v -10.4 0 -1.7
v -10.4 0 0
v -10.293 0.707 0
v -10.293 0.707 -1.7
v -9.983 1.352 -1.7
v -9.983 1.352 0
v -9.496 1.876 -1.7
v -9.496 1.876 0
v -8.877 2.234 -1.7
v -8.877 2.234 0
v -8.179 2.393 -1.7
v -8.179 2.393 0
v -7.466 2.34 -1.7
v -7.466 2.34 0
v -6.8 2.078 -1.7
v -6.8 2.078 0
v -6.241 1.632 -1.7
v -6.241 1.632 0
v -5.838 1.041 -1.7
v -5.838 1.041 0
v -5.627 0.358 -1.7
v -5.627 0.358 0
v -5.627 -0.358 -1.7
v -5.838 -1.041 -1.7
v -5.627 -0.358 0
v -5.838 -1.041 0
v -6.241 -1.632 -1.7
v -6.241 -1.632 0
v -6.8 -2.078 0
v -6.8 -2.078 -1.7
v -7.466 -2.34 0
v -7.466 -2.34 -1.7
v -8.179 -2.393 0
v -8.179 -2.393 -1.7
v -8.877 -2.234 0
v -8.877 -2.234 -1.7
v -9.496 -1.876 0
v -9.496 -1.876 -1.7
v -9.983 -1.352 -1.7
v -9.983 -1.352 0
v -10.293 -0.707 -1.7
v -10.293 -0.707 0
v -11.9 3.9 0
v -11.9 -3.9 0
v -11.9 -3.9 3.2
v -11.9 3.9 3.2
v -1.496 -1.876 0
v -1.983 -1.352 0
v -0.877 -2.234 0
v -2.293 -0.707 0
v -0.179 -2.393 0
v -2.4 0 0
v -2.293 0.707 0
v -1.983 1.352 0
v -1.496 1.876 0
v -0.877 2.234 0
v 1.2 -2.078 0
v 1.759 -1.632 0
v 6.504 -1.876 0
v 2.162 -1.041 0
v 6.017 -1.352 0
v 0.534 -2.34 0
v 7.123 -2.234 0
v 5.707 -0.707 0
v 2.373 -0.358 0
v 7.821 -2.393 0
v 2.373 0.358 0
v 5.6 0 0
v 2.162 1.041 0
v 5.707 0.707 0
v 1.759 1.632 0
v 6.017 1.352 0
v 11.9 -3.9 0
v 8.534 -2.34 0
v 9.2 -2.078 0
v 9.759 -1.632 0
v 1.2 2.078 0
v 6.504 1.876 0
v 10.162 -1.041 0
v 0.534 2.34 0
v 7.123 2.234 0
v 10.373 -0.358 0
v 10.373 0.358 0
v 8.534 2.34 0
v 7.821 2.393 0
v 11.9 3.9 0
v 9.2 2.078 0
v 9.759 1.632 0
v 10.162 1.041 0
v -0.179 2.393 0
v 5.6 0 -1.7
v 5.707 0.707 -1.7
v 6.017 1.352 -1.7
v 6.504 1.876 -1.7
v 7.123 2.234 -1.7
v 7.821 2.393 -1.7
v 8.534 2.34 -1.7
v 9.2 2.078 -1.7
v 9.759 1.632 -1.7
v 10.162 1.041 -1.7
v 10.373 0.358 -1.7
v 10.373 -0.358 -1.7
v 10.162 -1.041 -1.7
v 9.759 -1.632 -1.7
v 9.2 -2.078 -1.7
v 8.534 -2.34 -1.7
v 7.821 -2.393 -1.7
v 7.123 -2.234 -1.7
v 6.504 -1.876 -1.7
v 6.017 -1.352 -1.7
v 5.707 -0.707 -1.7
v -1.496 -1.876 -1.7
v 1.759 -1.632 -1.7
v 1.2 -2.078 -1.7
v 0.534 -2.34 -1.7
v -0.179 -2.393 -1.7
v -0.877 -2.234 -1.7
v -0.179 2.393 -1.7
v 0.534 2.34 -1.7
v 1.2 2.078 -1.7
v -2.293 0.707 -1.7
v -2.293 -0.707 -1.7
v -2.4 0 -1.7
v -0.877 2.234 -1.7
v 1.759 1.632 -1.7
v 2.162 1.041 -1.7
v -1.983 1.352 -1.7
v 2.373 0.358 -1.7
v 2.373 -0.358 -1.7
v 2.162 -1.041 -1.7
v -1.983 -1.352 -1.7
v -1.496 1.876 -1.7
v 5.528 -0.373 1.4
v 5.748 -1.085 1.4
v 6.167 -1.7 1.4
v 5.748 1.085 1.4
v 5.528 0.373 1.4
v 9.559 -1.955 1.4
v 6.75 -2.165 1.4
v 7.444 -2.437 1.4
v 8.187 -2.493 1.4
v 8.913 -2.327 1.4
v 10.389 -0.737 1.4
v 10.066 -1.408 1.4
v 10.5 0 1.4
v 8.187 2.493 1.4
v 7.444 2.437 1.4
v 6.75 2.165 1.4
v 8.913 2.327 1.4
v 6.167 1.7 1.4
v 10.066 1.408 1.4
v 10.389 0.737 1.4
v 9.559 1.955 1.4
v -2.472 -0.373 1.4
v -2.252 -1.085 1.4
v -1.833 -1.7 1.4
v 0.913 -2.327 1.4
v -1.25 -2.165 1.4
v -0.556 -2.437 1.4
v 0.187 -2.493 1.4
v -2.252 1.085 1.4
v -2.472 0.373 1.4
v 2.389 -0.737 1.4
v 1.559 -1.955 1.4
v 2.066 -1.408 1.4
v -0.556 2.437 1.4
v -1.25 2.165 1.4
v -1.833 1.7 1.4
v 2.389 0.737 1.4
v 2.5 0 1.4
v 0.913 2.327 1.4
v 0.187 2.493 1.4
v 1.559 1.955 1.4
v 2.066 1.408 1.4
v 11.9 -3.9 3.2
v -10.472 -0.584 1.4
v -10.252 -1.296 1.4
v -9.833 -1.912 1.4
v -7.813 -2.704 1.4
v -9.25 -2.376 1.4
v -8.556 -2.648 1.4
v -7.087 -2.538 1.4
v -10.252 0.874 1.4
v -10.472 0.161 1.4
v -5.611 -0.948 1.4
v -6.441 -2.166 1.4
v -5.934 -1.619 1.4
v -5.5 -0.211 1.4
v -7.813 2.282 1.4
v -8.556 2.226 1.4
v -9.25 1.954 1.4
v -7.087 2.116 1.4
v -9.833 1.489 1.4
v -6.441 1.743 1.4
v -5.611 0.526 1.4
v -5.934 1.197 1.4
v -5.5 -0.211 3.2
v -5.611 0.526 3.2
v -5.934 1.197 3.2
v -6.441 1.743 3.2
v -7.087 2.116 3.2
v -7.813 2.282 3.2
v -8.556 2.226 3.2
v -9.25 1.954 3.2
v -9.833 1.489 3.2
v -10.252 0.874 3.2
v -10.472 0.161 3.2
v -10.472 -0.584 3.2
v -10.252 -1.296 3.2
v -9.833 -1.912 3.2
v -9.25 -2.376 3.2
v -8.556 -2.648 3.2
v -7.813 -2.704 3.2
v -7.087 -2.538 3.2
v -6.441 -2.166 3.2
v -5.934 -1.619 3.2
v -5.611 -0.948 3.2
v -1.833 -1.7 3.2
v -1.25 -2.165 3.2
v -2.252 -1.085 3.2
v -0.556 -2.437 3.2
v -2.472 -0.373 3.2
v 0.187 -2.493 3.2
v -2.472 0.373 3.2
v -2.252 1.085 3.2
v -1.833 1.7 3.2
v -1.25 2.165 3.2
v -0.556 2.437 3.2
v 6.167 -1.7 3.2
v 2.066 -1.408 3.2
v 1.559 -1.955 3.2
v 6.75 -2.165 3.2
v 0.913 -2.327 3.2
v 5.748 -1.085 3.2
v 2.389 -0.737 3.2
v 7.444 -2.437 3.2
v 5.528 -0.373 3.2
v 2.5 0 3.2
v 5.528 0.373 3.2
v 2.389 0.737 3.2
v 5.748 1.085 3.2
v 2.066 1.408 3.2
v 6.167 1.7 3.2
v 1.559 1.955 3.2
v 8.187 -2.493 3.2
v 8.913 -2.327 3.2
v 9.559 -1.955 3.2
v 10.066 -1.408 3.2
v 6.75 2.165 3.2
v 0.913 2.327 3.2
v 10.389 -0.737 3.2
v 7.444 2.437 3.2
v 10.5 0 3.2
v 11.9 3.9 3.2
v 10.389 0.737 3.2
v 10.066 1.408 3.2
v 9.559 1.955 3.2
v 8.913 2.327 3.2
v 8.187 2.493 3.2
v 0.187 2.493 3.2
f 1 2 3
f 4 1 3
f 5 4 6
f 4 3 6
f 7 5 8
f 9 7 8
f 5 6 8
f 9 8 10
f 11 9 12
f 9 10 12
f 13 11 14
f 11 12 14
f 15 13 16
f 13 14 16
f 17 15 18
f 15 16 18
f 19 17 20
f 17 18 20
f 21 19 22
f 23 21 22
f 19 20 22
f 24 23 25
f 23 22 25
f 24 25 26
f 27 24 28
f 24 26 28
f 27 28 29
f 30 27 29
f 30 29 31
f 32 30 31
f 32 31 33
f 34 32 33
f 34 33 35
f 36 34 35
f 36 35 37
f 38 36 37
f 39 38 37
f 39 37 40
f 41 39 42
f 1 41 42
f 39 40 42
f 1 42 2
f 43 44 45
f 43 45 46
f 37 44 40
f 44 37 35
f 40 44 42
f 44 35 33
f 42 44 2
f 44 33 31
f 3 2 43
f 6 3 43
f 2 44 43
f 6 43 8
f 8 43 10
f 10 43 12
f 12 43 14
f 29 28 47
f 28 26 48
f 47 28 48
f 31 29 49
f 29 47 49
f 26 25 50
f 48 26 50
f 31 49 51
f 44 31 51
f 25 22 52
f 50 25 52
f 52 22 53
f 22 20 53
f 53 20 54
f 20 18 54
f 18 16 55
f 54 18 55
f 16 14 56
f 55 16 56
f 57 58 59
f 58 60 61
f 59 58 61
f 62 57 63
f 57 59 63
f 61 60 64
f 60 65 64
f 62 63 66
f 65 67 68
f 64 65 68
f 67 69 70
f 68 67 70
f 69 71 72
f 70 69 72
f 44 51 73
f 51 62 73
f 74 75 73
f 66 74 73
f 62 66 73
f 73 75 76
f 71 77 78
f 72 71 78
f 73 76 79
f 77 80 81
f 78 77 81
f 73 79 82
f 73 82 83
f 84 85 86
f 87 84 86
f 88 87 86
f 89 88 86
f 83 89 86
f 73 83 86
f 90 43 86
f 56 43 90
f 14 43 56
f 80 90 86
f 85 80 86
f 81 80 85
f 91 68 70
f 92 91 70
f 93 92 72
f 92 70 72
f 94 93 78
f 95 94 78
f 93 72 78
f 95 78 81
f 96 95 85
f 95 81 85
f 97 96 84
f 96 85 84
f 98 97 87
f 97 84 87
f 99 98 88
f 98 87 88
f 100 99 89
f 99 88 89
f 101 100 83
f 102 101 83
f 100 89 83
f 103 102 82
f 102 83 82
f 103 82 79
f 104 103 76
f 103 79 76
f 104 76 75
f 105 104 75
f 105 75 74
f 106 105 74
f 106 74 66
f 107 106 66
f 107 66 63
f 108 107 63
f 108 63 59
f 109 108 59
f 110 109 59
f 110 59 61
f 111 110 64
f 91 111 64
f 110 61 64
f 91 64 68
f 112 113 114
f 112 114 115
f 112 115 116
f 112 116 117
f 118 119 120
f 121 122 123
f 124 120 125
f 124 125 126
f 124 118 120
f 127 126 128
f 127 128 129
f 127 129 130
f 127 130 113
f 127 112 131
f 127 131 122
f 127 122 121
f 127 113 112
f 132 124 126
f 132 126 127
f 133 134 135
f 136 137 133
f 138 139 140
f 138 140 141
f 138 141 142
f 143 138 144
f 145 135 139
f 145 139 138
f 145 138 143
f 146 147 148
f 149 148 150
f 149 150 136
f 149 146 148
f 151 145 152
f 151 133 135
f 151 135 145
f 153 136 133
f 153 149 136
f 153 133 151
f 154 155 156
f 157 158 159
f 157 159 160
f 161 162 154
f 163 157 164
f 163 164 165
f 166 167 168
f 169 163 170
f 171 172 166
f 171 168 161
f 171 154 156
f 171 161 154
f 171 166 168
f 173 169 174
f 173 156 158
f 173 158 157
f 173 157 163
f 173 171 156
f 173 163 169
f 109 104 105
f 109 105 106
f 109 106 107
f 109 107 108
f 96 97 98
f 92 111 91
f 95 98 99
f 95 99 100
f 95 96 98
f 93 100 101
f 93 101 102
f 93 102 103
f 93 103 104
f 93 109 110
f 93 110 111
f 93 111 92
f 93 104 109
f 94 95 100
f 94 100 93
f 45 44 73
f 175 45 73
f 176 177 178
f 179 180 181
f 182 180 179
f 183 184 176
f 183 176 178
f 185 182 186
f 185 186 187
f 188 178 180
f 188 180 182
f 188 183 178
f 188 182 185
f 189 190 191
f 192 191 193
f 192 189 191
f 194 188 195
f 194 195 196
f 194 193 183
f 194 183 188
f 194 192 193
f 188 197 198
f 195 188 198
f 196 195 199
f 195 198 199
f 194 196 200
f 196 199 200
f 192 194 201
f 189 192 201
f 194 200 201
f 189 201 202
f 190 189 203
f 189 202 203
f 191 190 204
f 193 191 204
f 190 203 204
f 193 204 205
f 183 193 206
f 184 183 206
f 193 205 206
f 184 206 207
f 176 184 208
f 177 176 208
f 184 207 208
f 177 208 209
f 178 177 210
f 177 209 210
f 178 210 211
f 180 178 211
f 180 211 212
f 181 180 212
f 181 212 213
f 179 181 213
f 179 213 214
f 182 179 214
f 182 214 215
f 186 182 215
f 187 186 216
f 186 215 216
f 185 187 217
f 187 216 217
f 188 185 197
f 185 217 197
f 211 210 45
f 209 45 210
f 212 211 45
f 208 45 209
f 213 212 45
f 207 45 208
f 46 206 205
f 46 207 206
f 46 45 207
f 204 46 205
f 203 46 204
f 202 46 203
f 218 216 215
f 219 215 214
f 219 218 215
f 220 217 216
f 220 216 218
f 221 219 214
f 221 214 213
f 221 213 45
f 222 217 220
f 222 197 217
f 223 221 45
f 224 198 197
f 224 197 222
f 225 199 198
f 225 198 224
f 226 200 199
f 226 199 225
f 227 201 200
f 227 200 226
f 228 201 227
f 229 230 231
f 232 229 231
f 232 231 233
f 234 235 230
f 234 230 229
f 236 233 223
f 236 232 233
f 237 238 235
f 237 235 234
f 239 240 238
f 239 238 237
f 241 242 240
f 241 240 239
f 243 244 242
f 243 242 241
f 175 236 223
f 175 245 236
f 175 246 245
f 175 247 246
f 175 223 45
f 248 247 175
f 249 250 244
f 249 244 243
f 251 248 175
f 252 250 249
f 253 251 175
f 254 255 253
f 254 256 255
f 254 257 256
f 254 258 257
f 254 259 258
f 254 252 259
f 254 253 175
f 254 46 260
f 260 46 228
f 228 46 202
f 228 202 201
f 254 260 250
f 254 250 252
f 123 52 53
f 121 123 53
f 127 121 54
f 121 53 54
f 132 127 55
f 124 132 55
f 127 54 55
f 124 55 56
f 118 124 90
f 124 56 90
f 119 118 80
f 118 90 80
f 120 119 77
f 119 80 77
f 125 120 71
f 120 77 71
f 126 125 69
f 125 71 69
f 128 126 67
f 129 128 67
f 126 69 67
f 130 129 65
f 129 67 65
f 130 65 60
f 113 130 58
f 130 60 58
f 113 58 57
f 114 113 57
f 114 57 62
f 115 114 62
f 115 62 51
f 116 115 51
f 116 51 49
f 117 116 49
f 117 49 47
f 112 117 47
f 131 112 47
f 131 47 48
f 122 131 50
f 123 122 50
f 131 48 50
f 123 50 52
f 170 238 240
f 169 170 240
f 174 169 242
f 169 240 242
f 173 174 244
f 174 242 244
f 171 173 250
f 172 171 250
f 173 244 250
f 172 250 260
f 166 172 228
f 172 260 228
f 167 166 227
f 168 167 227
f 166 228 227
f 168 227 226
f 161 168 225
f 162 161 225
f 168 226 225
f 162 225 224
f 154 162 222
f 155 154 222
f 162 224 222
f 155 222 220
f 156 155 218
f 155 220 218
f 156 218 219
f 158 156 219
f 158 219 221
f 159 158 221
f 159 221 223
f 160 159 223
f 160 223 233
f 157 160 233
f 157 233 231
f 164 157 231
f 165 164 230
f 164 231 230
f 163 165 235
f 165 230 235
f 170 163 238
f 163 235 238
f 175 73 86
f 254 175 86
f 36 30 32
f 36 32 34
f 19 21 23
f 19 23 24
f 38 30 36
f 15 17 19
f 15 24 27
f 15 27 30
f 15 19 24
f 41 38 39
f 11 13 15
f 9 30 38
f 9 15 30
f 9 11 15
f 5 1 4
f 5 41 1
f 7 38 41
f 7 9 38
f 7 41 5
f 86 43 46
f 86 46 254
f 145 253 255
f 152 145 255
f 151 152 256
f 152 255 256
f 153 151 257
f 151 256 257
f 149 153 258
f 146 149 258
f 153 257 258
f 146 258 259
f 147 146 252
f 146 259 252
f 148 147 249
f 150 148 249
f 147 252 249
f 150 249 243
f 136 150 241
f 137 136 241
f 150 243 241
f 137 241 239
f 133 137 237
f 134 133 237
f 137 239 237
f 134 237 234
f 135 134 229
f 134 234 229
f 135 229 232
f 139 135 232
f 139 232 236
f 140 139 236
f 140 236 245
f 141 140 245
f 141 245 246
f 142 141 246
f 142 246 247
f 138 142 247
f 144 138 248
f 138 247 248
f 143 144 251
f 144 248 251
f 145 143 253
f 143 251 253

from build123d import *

# Parameters (mm, degrees)
SKETCH_1_W          = 23.8
SKETCH_1_H          = 7.8
EXTRUDE_1_DEPTH     = 3.2
SKETCH_2_R          = 2.4
EXTRUDE_2_DEPTH     = 1.7
SKETCH_3_R          = 2.5
CUT_EXTRUDE_1_DEPTH = 1.8


with BuildPart() as part:
    # Эскиз1 → Бобышка-Вытянуть1 (new body)
    with BuildSketch(Plane.XY):
        Rectangle(SKETCH_1_W, SKETCH_1_H)
    extrude(amount=EXTRUDE_1_DEPTH)

    # Эскиз2 → Бобышка-Вытянуть2 (add)
    with BuildSketch(Plane(origin=(0, 0, 0), x_dir=(-1, 0, 0), z_dir=(0, 0, -1))):
        Circle(SKETCH_2_R)
        with Locations((8, 0)):
            Circle(SKETCH_2_R)
        with Locations((-8, 0)):
            Circle(SKETCH_2_R)
    extrude(amount=EXTRUDE_2_DEPTH)

    # Эскиз3 → Вырез-Вытянуть1 (cut)
    with BuildSketch(Plane.XY.offset(3.2)):
        Circle(SKETCH_3_R)
        with Locations((-8, -0.211129939)):
            Circle(SKETCH_3_R)
        with Locations((8, 0)):
            Circle(SKETCH_3_R)
    extrude(amount=-CUT_EXTRUDE_1_DEPTH, mode=Mode.SUBTRACT)


solid = part.part
